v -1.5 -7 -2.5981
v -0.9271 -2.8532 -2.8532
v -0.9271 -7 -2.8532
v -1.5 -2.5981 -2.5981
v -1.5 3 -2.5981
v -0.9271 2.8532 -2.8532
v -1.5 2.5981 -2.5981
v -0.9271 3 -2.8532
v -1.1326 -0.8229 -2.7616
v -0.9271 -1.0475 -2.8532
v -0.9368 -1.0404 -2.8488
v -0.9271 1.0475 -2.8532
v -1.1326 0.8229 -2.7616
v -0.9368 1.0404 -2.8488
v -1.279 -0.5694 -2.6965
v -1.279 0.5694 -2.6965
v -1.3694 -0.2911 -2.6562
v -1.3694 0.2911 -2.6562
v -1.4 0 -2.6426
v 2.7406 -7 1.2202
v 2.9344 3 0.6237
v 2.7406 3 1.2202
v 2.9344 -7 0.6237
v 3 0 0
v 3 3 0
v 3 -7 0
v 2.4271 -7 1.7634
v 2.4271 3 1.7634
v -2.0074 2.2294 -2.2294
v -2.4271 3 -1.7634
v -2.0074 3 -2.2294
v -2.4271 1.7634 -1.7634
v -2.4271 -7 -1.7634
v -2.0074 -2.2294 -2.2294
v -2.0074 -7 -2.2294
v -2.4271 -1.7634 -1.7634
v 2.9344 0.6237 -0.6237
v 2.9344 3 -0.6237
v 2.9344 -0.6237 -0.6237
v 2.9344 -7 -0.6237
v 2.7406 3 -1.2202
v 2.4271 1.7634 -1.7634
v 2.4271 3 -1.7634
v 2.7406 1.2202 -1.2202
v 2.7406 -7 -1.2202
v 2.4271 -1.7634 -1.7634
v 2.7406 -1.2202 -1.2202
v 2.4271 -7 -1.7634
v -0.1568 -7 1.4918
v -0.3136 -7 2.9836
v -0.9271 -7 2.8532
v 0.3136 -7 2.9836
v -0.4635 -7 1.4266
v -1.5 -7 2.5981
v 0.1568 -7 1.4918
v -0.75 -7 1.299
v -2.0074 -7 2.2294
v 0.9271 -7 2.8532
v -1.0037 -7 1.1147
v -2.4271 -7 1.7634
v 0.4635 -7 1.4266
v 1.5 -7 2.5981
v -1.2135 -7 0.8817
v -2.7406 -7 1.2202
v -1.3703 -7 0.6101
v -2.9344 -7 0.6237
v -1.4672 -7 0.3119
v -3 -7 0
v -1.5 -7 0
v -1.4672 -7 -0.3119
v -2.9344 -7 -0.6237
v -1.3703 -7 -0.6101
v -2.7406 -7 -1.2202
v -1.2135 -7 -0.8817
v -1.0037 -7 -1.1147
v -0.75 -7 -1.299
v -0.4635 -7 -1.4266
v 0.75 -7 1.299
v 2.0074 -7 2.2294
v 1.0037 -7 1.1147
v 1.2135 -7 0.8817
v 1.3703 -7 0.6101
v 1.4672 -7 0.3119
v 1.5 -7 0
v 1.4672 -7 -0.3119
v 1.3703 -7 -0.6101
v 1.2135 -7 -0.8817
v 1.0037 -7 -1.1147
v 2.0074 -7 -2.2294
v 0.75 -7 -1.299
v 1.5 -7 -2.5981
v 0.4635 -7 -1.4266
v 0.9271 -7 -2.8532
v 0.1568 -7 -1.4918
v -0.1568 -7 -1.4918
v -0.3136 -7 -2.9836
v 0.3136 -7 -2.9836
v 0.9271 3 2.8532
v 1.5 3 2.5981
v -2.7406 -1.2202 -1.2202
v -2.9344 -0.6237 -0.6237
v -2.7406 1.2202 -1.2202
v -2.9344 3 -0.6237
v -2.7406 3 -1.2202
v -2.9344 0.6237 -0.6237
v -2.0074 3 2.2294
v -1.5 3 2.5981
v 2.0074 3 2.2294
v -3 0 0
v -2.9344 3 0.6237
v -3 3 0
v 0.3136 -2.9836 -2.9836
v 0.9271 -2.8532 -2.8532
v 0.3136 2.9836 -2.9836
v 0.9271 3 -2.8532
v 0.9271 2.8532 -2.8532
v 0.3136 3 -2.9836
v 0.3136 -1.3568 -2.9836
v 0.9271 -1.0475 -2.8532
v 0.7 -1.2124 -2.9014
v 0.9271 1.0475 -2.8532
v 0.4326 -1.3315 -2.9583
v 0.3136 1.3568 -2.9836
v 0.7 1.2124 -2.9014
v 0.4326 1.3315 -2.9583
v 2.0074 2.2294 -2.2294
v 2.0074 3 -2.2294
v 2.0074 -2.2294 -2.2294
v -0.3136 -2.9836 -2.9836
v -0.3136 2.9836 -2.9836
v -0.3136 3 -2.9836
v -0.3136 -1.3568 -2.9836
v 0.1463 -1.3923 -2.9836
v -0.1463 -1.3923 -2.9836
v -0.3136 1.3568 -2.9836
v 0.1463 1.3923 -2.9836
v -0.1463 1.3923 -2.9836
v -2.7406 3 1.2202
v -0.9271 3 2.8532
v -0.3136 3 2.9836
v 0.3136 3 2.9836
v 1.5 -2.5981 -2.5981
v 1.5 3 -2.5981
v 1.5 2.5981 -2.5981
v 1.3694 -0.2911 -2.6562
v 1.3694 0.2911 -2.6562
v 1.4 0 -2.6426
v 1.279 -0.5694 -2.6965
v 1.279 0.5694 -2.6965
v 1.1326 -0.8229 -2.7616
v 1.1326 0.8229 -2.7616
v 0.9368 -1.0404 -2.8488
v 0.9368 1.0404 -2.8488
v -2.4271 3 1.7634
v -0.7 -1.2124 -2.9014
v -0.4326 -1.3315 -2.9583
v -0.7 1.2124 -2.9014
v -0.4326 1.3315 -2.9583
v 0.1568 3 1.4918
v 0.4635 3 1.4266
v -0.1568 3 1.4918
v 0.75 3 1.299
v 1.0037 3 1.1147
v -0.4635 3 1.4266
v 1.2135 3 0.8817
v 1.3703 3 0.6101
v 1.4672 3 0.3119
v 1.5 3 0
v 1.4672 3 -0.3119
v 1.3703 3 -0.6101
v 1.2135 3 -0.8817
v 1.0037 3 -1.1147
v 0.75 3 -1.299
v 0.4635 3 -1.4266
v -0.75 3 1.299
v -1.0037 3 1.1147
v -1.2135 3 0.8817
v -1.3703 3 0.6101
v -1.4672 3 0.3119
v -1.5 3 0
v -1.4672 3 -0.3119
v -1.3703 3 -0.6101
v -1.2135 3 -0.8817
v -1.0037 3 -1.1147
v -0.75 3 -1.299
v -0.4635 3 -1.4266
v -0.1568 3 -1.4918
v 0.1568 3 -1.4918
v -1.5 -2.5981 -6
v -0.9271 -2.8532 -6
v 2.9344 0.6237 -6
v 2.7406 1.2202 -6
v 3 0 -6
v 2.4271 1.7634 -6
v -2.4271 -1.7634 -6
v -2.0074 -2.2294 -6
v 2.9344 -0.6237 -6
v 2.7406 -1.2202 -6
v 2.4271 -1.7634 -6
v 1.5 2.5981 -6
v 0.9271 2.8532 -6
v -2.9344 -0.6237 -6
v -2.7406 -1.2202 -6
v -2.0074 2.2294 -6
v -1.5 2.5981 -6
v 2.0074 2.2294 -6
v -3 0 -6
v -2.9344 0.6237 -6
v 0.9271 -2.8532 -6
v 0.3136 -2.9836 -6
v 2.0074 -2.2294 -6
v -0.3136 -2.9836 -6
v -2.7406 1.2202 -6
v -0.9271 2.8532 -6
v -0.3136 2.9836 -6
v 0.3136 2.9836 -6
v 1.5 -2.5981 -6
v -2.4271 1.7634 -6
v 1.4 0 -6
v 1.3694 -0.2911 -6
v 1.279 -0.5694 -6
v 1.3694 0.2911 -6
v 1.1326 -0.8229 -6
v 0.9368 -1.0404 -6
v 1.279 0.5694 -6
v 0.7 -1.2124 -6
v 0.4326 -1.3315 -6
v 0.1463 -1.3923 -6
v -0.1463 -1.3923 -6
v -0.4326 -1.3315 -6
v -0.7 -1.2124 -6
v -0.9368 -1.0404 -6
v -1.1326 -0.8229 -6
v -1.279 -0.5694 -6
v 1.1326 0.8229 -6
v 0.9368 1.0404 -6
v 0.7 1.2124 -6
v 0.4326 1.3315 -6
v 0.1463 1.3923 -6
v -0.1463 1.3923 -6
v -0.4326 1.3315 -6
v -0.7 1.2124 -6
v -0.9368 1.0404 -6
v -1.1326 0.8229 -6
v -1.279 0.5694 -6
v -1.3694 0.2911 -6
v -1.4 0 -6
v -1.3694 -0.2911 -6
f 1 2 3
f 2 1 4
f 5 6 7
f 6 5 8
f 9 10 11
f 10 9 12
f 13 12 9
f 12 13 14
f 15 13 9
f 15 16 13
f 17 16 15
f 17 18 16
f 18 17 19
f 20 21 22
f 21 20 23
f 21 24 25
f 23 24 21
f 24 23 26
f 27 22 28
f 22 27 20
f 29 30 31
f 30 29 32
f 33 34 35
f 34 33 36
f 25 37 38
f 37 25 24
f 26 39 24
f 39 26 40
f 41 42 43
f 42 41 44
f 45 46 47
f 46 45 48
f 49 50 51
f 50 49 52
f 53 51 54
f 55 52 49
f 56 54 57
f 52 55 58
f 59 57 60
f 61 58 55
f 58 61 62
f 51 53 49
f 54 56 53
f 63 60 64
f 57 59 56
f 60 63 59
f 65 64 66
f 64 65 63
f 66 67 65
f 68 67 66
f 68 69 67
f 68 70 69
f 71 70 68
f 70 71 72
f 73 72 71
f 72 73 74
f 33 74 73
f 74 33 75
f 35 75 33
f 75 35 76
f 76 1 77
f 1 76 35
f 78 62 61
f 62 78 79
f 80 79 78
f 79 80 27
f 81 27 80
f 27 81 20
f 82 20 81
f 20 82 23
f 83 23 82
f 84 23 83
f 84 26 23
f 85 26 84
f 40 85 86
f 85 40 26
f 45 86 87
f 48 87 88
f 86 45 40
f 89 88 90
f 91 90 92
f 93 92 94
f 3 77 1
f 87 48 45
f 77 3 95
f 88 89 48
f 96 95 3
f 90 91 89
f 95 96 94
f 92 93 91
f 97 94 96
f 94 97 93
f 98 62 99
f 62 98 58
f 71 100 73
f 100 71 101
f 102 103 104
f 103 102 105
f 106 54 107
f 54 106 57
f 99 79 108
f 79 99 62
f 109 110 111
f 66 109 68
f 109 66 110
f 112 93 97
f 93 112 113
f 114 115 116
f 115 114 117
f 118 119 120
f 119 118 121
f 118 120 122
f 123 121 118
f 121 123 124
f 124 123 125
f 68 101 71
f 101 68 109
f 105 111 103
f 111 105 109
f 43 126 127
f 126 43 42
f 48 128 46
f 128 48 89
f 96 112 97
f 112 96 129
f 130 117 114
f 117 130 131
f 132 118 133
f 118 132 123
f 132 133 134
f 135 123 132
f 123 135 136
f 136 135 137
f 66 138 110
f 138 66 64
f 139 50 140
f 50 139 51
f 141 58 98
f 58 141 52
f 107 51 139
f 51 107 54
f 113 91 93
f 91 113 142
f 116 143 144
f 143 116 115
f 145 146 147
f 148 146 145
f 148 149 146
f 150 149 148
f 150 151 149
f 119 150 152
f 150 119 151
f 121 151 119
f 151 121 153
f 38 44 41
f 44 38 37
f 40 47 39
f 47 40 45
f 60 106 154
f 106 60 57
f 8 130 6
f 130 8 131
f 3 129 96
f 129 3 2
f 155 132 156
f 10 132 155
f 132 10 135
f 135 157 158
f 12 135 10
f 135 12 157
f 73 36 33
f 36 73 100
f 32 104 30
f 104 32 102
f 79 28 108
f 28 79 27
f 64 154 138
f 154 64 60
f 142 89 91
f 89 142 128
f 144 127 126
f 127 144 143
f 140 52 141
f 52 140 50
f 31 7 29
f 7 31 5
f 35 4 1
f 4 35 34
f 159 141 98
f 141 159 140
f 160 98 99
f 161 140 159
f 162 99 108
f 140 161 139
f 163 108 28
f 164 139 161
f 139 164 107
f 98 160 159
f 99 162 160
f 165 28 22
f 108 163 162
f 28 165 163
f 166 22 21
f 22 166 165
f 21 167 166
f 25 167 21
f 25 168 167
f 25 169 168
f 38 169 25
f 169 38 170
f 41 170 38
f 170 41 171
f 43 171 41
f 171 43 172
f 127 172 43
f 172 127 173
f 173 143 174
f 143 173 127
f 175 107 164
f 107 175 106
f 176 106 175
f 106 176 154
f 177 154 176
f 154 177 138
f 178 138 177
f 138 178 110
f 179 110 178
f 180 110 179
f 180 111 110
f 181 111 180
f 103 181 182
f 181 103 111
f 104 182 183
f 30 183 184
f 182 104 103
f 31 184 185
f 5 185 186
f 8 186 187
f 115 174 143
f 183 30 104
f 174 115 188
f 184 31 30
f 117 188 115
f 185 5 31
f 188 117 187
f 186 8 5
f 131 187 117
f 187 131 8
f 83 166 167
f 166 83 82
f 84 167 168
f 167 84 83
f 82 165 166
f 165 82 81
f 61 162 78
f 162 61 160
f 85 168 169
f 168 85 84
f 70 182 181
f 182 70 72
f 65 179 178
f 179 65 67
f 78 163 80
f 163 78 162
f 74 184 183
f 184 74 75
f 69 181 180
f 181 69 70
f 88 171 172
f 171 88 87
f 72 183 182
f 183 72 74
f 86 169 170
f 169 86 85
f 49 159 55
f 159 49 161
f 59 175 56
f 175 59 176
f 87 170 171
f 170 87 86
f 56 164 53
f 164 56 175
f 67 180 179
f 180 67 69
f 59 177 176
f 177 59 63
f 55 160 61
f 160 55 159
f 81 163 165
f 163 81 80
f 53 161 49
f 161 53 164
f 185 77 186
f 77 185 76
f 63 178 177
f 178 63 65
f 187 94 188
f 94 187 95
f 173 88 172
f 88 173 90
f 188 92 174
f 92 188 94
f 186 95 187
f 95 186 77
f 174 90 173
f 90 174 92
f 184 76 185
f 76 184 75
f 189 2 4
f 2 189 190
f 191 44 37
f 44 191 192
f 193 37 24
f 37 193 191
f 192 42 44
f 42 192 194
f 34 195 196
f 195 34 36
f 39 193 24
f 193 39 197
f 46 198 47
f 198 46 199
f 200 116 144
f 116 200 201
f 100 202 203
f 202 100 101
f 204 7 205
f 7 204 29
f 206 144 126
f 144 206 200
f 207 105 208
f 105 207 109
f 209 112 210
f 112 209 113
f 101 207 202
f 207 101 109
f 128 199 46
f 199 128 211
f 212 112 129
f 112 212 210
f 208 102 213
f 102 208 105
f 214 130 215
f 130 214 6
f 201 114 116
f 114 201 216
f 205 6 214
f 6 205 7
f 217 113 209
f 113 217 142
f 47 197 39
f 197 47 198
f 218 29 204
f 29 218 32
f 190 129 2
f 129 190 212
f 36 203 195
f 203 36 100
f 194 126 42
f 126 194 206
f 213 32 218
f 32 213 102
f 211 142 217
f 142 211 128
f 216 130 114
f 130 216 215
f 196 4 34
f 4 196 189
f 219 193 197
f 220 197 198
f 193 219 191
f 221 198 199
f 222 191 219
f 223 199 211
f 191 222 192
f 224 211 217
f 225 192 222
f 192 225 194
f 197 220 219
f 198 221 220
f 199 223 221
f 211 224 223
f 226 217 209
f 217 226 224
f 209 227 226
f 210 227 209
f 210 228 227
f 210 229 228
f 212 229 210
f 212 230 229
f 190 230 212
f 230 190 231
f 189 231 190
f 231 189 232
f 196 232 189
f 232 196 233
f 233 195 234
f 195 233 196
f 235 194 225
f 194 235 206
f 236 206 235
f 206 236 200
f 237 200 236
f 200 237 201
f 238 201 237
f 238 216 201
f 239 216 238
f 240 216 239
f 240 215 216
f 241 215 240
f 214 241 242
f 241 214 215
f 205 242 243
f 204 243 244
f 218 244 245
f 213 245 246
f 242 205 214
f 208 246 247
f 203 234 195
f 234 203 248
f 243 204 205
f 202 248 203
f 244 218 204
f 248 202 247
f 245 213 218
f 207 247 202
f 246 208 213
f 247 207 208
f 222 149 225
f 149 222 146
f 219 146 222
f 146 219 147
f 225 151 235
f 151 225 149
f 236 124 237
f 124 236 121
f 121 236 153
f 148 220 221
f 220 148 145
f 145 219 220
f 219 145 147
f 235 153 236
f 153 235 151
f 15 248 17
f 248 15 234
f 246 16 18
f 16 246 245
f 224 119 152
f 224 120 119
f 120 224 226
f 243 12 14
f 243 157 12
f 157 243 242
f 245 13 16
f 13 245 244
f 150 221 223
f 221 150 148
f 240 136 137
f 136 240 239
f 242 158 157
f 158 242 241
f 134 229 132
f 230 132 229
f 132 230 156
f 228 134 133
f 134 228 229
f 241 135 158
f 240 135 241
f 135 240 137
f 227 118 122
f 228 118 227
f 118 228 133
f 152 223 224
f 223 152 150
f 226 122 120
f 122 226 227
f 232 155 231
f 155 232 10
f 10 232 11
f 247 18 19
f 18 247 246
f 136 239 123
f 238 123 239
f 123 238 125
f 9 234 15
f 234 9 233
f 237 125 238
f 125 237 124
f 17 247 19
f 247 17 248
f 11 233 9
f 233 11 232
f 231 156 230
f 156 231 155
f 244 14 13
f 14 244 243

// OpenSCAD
SCREW_DIA = 2.8;
STANDOFF_DIA = 6;
STANDOFF_HEIGHT = 6;
SCREW_LENGTH = STANDOFF_HEIGHT;

PEG_DIA = 3;
PEG_LENGTH = 3;
MOUNT_DIA = STANDOFF_DIA;
MOUNT_LENGTH = 10;

ANGLE = 90;
ROUNDED = false;
PEG = false;

$fn = 30;

module tube(outer_dia, inner_dia, outer_height, inner_height) {
    difference() {
        cylinder(d = outer_dia, h = outer_height);
        cylinder(d = inner_dia, h = inner_height);
    }    
}

module standoff() {
    tube(STANDOFF_DIA, SCREW_DIA, STANDOFF_HEIGHT, SCREW_LENGTH);    
}

module peg(outer_dia, inner_dia, outer_height, inner_height) {
    union() {
        cylinder(d = outer_dia, h = outer_height);
        cylinder(d = inner_dia, h = inner_height);
    }
}

module mount() {
    union() {
        intersection() {
            if(PEG) {
                peg(MOUNT_DIA, PEG_DIA, MOUNT_LENGTH, MOUNT_LENGTH + PEG_LENGTH);
            } else {
                tube(MOUNT_DIA, PEG_DIA, MOUNT_LENGTH, MOUNT_LENGTH);
            }
            if(ROUNDED) {
                translate([0, 0, MOUNT_DIA/2])
                    union() {
                        cylinder(d = MOUNT_DIA, h = MOUNT_LENGTH+PEG_LENGTH);
                        sphere(d = MOUNT_DIA);
                    }
            } else {
                cylinder(d = MOUNT_DIA, h = MOUNT_LENGTH+PEG_LENGTH);
            }
        }
    }    
}

module mount_joint() {
    rotate([ANGLE, 0, 0])
        translate([0, 0, -MOUNT_DIA/2])
        mount();
}

union() {
    mount_joint();
    difference() {
        translate([0, -MOUNT_DIA/2+STANDOFF_DIA/2, -STANDOFF_HEIGHT])
            standoff();
        hull() 
            mount_joint();
    }
}
